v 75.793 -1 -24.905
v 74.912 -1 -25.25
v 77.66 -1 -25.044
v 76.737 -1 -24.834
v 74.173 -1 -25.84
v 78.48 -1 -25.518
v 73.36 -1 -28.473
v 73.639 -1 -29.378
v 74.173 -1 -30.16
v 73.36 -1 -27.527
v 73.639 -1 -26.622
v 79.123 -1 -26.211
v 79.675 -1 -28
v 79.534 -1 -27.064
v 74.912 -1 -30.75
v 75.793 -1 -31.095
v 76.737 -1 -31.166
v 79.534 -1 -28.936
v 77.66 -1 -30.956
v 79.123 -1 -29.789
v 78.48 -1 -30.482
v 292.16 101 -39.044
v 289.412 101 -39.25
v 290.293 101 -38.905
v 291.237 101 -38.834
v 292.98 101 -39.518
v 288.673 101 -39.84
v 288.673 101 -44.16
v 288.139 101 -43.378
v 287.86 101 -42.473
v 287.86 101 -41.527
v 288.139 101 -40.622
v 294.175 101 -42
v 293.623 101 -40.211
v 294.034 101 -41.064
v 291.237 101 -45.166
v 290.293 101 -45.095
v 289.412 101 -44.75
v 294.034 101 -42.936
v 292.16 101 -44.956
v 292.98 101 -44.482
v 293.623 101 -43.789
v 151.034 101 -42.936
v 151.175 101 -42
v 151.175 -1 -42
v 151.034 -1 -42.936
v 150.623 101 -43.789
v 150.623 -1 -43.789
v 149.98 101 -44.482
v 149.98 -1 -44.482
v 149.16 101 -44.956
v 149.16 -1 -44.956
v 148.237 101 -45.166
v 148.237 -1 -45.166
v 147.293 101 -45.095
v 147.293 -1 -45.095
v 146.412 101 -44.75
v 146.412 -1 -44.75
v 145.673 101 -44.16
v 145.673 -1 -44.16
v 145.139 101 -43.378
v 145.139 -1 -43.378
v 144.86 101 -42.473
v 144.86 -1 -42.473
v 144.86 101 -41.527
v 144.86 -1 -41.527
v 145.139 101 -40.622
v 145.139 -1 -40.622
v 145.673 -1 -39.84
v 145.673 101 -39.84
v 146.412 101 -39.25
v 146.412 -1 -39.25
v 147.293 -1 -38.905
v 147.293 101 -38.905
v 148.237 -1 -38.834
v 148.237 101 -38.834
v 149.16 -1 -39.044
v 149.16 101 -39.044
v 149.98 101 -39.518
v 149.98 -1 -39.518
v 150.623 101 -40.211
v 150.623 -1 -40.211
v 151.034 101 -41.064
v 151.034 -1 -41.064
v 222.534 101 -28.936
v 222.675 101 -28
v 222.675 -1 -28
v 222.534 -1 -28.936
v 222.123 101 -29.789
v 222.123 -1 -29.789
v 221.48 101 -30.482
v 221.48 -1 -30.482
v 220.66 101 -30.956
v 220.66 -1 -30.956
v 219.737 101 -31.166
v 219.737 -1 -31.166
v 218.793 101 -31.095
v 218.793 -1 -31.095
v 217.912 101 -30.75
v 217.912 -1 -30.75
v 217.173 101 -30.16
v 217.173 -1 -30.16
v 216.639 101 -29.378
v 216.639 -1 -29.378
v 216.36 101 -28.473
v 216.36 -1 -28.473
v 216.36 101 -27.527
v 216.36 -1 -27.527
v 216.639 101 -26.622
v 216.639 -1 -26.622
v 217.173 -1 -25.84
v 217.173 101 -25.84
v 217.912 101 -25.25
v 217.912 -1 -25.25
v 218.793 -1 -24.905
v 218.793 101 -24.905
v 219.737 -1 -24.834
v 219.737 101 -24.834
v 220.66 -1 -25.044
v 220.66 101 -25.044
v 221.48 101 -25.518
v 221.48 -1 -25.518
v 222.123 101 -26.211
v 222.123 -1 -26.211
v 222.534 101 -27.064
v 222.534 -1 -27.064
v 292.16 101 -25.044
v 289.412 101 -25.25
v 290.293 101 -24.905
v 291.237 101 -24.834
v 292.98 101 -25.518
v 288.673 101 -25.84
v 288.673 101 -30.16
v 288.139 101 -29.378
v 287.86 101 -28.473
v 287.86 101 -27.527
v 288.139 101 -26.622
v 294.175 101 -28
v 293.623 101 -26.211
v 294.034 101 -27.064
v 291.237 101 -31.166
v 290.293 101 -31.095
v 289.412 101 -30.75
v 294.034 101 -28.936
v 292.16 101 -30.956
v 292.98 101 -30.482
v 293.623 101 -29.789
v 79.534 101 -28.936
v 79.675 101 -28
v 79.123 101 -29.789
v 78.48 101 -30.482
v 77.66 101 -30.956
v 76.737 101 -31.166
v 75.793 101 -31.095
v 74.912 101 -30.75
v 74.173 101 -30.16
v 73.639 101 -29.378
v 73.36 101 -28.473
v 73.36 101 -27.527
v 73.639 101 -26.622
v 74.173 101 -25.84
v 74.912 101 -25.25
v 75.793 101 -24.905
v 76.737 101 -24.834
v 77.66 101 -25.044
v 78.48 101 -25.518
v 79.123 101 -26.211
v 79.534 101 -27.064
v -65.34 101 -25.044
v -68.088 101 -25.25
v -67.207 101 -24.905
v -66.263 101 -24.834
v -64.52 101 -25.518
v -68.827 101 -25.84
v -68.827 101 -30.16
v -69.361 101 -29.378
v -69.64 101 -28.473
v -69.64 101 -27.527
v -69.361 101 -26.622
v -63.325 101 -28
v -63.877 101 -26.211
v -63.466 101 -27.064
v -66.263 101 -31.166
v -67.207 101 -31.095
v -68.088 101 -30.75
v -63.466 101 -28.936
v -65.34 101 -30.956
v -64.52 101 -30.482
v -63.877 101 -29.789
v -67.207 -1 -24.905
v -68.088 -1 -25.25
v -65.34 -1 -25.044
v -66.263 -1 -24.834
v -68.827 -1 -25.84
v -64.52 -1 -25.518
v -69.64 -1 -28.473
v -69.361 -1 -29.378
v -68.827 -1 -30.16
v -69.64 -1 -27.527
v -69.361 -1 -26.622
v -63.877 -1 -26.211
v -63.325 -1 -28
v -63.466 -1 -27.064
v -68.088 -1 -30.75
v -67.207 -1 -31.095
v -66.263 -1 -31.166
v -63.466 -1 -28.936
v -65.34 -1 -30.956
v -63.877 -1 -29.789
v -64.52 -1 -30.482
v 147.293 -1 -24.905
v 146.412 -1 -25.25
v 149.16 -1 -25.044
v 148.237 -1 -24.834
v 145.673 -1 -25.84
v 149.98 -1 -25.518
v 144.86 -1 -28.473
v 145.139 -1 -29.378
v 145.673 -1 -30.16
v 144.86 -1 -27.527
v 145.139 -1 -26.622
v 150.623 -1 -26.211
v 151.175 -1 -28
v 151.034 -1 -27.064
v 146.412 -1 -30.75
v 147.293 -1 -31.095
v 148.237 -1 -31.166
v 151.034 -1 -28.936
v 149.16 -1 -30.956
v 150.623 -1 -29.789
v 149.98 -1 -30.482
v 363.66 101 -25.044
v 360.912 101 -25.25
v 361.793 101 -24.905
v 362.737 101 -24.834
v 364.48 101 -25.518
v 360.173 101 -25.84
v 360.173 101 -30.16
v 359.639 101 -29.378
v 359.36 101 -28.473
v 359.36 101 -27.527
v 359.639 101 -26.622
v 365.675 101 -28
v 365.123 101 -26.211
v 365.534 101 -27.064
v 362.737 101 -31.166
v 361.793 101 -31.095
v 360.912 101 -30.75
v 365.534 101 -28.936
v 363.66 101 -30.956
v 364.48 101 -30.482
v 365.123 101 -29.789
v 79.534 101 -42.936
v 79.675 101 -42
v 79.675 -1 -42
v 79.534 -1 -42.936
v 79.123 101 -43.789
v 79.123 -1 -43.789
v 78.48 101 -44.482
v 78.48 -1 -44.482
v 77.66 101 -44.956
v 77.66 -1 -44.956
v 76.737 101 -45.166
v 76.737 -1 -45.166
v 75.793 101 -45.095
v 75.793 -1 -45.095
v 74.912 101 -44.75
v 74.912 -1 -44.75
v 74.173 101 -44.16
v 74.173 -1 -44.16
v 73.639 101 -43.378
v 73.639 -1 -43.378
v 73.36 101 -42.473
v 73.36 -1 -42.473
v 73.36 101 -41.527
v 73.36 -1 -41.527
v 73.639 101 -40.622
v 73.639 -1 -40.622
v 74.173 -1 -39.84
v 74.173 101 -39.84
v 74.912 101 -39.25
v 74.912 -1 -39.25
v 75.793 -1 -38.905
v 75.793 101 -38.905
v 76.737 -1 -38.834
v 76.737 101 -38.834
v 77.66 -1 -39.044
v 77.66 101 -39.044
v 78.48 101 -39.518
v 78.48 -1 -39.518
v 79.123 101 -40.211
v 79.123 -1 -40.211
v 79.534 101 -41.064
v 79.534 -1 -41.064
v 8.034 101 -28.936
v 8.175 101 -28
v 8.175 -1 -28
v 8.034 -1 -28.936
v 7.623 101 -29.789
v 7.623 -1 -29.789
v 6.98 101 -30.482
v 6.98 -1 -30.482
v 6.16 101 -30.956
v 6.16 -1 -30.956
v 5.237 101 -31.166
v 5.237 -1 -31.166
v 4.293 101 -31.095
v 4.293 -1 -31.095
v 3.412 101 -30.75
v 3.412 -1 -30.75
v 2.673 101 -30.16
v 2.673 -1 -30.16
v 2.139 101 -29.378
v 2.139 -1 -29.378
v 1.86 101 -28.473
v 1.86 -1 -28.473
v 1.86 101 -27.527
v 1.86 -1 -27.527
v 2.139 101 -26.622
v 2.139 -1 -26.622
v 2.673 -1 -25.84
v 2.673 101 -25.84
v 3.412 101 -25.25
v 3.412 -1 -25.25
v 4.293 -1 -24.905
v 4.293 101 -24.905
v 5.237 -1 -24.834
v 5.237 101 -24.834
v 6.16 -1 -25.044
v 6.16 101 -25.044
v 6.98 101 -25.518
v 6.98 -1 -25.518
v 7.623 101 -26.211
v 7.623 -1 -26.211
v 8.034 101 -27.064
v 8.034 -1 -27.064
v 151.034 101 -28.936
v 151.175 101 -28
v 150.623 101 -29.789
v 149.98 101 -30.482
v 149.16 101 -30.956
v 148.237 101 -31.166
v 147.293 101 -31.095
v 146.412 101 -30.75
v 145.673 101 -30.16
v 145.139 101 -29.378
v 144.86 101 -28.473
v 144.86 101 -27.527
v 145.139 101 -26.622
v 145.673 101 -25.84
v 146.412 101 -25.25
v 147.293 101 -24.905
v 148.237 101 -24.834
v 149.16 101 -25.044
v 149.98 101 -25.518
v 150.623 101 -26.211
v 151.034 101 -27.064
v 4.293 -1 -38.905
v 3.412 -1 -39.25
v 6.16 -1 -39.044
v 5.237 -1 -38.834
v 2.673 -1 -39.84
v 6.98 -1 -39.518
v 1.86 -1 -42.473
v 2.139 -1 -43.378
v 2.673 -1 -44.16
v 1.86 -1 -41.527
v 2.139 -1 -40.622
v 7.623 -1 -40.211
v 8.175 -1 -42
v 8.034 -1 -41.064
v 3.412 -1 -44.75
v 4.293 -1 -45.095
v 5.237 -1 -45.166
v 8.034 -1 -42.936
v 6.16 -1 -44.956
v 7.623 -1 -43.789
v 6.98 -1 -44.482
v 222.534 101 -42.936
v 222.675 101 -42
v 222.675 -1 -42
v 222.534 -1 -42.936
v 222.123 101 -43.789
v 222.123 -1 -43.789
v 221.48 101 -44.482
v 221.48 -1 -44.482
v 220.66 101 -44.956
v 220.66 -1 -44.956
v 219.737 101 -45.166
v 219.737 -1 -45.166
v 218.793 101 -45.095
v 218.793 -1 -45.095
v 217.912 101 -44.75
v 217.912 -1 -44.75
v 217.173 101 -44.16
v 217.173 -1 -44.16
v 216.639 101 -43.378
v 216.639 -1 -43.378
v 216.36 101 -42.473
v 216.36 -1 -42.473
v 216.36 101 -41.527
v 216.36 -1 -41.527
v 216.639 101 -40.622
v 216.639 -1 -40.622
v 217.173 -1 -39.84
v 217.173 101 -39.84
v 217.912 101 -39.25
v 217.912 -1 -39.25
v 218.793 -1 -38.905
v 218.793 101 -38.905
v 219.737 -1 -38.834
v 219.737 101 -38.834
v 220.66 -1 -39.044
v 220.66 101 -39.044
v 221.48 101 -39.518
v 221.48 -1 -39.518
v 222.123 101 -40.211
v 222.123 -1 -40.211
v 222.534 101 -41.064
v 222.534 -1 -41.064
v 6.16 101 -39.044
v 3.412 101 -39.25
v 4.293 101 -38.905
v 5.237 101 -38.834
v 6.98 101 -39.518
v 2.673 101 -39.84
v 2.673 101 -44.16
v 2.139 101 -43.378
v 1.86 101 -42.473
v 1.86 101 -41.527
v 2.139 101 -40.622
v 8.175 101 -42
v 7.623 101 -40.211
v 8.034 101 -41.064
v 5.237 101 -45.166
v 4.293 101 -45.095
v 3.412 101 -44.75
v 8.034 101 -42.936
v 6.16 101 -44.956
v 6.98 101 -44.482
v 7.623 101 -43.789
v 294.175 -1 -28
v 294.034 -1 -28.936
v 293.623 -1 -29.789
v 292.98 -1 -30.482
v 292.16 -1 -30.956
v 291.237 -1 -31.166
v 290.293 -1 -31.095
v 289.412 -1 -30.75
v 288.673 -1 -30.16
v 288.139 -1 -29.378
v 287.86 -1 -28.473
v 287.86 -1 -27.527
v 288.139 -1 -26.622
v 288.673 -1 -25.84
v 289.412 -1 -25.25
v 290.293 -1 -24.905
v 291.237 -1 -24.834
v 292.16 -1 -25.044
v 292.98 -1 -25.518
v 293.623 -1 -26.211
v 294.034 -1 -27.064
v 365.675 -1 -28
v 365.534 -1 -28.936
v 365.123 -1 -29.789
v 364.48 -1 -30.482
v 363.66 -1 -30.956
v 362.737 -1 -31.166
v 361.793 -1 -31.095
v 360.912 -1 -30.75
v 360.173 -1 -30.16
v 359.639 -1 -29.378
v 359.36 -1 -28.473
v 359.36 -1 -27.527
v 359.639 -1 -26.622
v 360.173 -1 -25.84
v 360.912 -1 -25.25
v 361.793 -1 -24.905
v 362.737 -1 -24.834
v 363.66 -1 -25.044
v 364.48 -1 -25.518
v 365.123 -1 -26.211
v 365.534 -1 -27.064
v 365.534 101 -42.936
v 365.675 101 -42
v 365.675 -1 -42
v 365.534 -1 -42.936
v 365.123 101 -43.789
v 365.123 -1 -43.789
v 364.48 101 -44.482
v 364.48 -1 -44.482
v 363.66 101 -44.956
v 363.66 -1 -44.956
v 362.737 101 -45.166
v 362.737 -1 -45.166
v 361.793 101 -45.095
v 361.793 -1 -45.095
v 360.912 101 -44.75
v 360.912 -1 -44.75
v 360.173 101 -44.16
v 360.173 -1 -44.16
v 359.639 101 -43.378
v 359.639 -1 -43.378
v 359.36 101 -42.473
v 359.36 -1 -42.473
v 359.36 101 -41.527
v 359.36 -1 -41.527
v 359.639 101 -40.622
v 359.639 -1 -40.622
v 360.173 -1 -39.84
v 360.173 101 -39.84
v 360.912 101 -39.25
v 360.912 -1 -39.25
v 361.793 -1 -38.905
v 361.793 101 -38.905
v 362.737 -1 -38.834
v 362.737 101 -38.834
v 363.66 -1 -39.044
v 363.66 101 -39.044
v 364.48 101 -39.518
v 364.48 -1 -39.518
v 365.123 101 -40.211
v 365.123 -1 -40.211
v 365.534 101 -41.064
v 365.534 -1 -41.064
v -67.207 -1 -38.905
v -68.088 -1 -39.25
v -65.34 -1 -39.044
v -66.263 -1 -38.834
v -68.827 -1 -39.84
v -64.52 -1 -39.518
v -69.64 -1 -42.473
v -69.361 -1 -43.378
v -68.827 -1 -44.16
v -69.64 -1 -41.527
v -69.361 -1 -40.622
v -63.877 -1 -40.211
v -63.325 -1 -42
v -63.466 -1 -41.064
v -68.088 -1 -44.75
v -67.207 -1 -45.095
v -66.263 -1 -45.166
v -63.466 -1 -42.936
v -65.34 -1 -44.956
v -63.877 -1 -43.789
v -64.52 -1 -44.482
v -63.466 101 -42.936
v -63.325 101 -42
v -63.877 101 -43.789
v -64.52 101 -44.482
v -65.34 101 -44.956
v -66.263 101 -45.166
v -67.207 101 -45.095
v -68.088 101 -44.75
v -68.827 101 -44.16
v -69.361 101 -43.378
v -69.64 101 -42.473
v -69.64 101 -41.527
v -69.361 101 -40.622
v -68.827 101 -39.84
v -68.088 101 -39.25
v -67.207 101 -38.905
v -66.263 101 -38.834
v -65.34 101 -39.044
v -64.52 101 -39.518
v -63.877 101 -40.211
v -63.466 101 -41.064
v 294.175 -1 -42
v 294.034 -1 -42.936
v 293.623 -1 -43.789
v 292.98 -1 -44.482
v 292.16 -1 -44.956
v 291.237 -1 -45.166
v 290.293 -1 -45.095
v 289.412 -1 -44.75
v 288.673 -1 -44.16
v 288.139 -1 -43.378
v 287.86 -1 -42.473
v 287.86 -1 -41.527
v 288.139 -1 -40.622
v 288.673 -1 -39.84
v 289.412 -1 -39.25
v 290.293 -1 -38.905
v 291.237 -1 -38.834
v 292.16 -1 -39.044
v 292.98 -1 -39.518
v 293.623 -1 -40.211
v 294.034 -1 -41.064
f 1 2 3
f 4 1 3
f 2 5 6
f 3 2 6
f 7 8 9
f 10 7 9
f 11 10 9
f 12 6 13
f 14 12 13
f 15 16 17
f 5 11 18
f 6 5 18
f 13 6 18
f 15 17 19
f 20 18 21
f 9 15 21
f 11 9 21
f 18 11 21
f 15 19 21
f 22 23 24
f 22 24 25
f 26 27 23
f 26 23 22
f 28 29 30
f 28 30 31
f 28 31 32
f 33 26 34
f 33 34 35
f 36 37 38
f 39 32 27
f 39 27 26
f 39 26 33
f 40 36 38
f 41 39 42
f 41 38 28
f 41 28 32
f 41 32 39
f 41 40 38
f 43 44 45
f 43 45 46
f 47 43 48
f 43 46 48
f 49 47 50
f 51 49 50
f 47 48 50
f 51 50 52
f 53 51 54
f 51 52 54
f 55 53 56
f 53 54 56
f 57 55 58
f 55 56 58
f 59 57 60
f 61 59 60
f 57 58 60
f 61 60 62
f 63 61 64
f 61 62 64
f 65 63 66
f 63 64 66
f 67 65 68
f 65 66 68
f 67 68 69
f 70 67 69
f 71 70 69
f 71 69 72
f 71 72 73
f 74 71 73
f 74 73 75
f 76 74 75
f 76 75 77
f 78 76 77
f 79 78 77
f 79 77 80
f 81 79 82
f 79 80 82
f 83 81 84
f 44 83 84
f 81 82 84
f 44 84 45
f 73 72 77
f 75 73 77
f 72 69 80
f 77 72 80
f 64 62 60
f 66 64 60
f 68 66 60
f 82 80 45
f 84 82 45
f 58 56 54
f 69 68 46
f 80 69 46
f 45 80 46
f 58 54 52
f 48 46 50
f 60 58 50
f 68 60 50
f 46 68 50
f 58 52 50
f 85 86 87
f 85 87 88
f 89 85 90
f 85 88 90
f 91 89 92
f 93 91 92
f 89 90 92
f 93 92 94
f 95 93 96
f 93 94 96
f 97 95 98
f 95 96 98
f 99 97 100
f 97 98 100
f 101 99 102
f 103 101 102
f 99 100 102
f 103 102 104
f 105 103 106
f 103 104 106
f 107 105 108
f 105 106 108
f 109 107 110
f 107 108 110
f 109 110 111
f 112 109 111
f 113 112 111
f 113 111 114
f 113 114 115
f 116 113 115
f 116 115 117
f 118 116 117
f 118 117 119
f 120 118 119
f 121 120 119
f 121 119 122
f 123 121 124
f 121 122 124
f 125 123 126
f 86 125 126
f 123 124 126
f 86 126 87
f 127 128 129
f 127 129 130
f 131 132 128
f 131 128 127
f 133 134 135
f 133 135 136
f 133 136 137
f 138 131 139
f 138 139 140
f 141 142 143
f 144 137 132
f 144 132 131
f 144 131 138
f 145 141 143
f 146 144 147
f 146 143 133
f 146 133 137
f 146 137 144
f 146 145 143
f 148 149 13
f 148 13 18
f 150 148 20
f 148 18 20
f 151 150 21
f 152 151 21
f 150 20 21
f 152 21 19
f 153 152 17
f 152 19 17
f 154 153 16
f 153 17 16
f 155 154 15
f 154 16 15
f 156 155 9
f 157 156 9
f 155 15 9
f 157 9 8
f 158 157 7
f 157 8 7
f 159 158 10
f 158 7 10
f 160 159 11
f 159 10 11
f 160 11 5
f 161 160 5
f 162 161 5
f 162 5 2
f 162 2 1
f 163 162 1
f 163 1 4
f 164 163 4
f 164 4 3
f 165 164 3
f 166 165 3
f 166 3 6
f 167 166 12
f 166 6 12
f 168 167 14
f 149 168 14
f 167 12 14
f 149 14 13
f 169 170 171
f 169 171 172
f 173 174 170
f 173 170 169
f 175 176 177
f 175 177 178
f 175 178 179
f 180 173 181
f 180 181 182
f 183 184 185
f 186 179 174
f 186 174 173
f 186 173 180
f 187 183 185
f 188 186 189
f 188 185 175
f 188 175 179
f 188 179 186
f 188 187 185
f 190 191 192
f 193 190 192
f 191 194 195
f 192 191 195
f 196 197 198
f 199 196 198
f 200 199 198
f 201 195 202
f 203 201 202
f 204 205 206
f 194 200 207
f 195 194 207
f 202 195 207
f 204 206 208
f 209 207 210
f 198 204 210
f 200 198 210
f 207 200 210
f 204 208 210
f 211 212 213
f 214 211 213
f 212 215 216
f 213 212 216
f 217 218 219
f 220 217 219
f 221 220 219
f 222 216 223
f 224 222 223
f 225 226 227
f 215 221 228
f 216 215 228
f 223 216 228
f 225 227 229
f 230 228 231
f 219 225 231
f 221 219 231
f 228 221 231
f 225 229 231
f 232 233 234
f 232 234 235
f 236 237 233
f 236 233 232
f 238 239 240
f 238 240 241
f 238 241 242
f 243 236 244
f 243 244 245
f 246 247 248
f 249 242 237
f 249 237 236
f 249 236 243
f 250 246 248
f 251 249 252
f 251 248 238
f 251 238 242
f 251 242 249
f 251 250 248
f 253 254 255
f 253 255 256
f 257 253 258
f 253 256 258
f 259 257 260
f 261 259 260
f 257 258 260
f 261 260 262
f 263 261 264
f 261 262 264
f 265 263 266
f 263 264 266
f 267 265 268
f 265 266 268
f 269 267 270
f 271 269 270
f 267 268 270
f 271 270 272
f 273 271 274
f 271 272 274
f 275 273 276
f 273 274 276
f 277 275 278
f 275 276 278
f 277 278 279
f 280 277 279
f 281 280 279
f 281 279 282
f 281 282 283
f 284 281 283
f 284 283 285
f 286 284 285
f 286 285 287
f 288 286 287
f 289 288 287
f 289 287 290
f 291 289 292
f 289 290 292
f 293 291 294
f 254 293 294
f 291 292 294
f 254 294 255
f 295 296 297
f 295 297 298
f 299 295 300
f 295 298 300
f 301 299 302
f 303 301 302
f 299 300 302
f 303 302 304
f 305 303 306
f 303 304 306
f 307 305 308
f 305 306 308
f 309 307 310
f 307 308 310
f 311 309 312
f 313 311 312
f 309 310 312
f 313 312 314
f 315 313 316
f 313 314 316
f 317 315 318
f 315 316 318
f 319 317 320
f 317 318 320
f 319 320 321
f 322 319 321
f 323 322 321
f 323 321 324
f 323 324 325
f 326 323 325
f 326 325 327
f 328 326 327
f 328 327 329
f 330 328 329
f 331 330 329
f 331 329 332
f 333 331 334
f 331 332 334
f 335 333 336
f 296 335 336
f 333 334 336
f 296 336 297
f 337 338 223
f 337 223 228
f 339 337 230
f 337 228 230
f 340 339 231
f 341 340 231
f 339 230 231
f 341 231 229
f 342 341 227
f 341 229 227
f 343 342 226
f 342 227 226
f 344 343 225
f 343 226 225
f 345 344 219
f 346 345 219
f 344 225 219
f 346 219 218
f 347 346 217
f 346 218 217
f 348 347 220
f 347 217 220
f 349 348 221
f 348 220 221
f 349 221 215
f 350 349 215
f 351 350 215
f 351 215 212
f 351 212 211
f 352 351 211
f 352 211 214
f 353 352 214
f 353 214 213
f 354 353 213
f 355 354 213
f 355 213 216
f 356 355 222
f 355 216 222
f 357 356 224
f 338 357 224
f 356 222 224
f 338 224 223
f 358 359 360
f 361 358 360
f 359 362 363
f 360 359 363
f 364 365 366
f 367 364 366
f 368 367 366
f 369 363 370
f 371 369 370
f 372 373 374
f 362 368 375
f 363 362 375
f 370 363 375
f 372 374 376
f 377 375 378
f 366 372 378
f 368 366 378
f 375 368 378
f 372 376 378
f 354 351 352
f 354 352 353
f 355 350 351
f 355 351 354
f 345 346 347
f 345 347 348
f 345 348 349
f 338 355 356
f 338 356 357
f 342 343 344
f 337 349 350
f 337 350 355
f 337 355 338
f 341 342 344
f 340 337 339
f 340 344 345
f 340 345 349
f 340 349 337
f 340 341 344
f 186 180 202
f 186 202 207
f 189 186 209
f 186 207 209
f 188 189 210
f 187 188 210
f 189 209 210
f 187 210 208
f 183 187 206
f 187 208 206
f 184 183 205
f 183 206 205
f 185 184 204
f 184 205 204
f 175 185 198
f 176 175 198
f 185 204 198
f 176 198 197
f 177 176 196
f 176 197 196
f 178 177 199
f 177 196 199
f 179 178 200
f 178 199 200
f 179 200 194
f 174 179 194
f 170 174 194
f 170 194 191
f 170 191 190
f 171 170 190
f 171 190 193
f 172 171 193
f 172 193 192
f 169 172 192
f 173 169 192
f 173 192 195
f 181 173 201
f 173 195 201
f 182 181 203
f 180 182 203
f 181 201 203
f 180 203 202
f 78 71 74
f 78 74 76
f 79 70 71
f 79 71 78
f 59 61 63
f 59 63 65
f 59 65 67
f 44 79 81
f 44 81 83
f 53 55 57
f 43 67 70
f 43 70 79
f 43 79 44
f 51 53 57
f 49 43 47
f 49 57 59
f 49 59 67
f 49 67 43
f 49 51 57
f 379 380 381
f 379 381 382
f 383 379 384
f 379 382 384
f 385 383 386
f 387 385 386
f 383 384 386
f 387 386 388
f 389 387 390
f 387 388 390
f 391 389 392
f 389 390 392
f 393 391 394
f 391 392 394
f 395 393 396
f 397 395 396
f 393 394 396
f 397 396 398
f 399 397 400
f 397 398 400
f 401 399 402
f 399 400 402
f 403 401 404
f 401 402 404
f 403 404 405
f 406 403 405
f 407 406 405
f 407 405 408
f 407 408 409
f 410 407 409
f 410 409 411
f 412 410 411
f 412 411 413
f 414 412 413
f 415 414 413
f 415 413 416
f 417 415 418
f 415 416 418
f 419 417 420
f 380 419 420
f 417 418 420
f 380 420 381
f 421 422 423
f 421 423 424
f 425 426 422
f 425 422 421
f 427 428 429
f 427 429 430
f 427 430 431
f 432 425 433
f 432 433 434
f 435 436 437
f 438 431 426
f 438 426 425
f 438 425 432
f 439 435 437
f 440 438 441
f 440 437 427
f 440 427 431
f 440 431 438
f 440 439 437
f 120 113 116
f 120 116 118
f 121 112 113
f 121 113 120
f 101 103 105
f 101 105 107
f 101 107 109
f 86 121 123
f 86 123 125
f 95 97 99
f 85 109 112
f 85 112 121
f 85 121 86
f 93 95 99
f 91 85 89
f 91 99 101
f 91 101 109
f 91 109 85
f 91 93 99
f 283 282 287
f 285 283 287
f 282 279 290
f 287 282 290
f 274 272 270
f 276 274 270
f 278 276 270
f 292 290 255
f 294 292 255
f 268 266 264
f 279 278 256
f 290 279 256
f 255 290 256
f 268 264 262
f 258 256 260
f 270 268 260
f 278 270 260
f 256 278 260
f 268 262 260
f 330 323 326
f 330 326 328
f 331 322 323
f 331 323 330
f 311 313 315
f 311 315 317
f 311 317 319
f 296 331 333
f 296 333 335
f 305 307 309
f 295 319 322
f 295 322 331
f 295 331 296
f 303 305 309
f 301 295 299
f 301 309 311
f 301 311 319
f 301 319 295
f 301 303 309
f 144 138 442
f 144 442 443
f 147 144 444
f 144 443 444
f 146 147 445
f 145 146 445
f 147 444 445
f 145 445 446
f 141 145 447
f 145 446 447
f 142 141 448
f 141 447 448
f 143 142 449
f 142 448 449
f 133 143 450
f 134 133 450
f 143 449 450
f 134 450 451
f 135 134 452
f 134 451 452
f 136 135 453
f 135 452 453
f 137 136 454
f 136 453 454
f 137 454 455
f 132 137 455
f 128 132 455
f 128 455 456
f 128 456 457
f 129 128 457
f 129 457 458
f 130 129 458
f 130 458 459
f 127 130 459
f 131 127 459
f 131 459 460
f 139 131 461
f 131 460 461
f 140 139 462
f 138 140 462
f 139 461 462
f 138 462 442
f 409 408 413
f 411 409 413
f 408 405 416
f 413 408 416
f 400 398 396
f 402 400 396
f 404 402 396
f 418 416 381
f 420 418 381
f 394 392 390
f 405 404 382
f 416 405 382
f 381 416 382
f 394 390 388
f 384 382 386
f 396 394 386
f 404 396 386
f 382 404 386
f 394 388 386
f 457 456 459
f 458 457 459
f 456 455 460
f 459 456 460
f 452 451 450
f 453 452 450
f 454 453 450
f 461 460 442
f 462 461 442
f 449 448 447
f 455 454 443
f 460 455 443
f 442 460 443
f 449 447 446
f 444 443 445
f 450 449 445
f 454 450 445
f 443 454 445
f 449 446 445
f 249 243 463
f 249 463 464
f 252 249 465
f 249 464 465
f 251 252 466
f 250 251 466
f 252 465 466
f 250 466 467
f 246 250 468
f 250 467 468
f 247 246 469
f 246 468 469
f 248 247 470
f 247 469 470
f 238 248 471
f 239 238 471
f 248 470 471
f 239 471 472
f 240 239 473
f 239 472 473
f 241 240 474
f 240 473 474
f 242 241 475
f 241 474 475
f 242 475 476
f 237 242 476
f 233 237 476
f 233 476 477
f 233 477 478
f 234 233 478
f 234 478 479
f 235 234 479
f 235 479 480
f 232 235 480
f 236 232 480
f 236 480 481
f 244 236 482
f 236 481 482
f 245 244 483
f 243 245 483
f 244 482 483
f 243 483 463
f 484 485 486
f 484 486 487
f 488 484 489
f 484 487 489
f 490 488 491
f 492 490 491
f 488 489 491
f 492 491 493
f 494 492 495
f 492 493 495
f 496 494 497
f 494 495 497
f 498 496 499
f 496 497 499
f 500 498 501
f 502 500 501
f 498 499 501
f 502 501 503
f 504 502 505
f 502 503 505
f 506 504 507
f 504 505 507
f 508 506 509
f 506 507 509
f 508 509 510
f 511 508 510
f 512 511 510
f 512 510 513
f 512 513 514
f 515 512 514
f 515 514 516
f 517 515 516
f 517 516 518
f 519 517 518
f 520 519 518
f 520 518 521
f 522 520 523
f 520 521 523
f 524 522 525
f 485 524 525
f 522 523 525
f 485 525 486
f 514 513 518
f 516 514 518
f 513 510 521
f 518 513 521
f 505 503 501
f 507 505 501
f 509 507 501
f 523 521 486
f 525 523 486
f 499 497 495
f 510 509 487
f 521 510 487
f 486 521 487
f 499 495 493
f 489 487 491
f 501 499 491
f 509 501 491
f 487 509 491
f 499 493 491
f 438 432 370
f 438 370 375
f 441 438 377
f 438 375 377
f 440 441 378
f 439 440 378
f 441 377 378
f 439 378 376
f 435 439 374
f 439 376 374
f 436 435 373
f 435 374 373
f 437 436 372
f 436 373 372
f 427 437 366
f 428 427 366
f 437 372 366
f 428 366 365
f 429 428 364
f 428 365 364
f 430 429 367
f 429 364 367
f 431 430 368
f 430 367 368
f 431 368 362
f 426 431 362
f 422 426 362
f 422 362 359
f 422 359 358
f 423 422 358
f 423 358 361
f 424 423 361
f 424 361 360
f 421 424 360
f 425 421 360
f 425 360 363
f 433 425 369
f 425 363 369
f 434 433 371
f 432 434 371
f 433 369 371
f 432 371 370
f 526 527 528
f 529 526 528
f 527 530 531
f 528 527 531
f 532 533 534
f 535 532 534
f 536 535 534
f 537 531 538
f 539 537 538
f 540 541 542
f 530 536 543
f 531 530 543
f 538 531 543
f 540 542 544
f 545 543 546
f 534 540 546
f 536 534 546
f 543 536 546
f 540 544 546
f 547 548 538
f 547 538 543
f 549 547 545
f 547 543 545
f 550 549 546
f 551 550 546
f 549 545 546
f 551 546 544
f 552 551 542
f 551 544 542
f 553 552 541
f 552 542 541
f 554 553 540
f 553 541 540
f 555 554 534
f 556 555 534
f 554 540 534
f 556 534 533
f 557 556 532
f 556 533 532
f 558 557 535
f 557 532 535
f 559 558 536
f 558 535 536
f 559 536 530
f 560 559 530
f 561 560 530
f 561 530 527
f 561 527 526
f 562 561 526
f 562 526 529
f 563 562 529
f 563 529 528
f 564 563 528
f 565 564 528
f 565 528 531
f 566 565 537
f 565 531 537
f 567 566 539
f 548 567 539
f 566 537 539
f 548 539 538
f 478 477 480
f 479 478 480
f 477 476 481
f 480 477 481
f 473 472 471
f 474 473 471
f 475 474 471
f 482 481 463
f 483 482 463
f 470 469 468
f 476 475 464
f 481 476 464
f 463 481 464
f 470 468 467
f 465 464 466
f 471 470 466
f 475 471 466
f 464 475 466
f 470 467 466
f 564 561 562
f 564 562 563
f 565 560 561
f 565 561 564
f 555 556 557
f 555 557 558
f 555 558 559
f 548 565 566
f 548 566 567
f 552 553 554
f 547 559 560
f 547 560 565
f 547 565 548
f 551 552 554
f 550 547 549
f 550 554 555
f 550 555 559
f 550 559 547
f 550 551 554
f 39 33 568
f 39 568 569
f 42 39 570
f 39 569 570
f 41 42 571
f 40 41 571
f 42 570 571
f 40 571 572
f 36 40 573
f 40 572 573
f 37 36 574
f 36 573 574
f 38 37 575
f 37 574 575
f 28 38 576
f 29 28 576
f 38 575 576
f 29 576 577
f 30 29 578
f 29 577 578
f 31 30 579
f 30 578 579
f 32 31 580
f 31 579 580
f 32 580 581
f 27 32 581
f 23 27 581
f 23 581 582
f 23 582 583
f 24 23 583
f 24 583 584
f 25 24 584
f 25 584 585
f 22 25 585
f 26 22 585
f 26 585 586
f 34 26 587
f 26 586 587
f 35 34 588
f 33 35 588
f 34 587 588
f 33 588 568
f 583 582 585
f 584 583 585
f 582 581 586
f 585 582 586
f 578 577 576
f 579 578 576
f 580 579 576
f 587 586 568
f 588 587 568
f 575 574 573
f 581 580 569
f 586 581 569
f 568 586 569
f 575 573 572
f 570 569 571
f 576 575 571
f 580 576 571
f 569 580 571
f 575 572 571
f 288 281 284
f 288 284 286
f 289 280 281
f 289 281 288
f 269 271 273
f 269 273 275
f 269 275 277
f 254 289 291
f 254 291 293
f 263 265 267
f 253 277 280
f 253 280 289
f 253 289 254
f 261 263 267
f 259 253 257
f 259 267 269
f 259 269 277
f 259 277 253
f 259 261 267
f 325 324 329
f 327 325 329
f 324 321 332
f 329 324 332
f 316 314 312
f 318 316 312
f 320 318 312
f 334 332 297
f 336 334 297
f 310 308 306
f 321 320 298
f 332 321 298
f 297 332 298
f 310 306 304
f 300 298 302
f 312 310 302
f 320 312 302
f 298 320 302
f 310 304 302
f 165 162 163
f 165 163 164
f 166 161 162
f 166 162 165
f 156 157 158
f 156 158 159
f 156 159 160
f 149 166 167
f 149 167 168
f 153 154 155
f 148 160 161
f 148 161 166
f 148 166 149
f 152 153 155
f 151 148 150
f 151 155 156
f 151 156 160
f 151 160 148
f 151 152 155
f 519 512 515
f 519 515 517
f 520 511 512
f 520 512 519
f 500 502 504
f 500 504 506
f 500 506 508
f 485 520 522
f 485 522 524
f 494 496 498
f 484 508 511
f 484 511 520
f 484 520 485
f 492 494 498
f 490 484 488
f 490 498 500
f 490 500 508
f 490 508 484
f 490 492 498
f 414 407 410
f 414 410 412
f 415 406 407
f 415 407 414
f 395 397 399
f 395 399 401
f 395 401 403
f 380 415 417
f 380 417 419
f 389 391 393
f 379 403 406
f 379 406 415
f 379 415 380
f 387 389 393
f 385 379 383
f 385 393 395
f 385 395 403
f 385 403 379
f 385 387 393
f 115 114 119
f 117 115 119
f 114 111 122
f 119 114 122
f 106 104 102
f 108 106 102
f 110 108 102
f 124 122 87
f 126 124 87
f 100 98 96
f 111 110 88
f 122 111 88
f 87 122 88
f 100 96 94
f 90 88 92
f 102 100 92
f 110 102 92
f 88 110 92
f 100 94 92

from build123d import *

# Parameters (mm, degrees)
SKETCH1_R              = 3.175
BOSS_EXTRUDE1_DEPTH    = 102
BOSS_EXTRUDE1_2_DEPTH  = 102
BOSS_EXTRUDE1_3_DEPTH  = 102
BOSS_EXTRUDE1_4_DEPTH  = 102
BOSS_EXTRUDE1_5_DEPTH  = 102
BOSS_EXTRUDE1_6_DEPTH  = 102
BOSS_EXTRUDE1_7_DEPTH  = 102
BOSS_EXTRUDE1_8_DEPTH  = 102
BOSS_EXTRUDE1_9_DEPTH  = 102
BOSS_EXTRUDE1_10_DEPTH = 102
BOSS_EXTRUDE1_11_DEPTH = 102
BOSS_EXTRUDE1_12_DEPTH = 102
BOSS_EXTRUDE1_13_DEPTH = 102
BOSS_EXTRUDE1_14_DEPTH = 102


with BuildPart() as part:
    # Sketch1 → Boss-Extrude1 (new body)
    with BuildSketch(Plane(origin=(0, -1, 0), x_dir=(1, 0, 0), z_dir=(0, 1, 0))):
        with Locations((-66.5, 42)):
            Circle(SKETCH1_R)
    extrude(amount=BOSS_EXTRUDE1_DEPTH)


with BuildPart() as body_2:
    # Sketch1 → Boss-Extrude1 2 (new body)
    with BuildSketch(Plane(origin=(0, -1, 0), x_dir=(1, 0, 0), z_dir=(0, 1, 0))):
        with Locations((-66.5, 28)):
            Circle(SKETCH1_R)
    extrude(amount=BOSS_EXTRUDE1_2_DEPTH)


with BuildPart() as body_3:
    # Sketch1 → Boss-Extrude1 3 (new body)
    with BuildSketch(Plane(origin=(0, -1, 0), x_dir=(1, 0, 0), z_dir=(0, 1, 0))):
        with Locations((5, 42)):
            Circle(SKETCH1_R)
    extrude(amount=BOSS_EXTRUDE1_3_DEPTH)


with BuildPart() as body_4:
    # Sketch1 → Boss-Extrude1 4 (new body)
    with BuildSketch(Plane(origin=(0, -1, 0), x_dir=(1, 0, 0), z_dir=(0, 1, 0))):
        with Locations((5, 28)):
            Circle(SKETCH1_R)
    extrude(amount=BOSS_EXTRUDE1_4_DEPTH)


with BuildPart() as body_5:
    # Sketch1 → Boss-Extrude1 5 (new body)
    with BuildSketch(Plane(origin=(0, -1, 0), x_dir=(1, 0, 0), z_dir=(0, 1, 0))):
        with Locations((76.5, 42)):
            Circle(SKETCH1_R)
    extrude(amount=BOSS_EXTRUDE1_5_DEPTH)


with BuildPart() as body_6:
    # Sketch1 → Boss-Extrude1 6 (new body)
    with BuildSketch(Plane(origin=(0, -1, 0), x_dir=(1, 0, 0), z_dir=(0, 1, 0))):
        with Locations((76.5, 28)):
            Circle(SKETCH1_R)
    extrude(amount=BOSS_EXTRUDE1_6_DEPTH)


with BuildPart() as body_7:
    # Sketch1 → Boss-Extrude1 7 (new body)
    with BuildSketch(Plane(origin=(0, -1, 0), x_dir=(1, 0, 0), z_dir=(0, 1, 0))):
        with Locations((148, 42)):
            Circle(SKETCH1_R)
    extrude(amount=BOSS_EXTRUDE1_7_DEPTH)


with BuildPart() as body_8:
    # Sketch1 → Boss-Extrude1 8 (new body)
    with BuildSketch(Plane(origin=(0, -1, 0), x_dir=(1, 0, 0), z_dir=(0, 1, 0))):
        with Locations((148, 28)):
            Circle(SKETCH1_R)
    extrude(amount=BOSS_EXTRUDE1_8_DEPTH)


with BuildPart() as body_9:
    # Sketch1 → Boss-Extrude1 9 (new body)
    with BuildSketch(Plane(origin=(0, -1, 0), x_dir=(1, 0, 0), z_dir=(0, 1, 0))):
        with Locations((219.5, 42)):
            Circle(SKETCH1_R)
    extrude(amount=BOSS_EXTRUDE1_9_DEPTH)


with BuildPart() as body_10:
    # Sketch1 → Boss-Extrude1 10 (new body)
    with BuildSketch(Plane(origin=(0, -1, 0), x_dir=(1, 0, 0), z_dir=(0, 1, 0))):
        with Locations((219.5, 28)):
            Circle(SKETCH1_R)
    extrude(amount=BOSS_EXTRUDE1_10_DEPTH)


with BuildPart() as body_11:
    # Sketch1 → Boss-Extrude1 11 (new body)
    with BuildSketch(Plane(origin=(0, -1, 0), x_dir=(1, 0, 0), z_dir=(0, 1, 0))):
        with Locations((291, 42)):
            Circle(SKETCH1_R)
    extrude(amount=BOSS_EXTRUDE1_11_DEPTH)


with BuildPart() as body_12:
    # Sketch1 → Boss-Extrude1 12 (new body)
    with BuildSketch(Plane(origin=(0, -1, 0), x_dir=(1, 0, 0), z_dir=(0, 1, 0))):
        with Locations((291, 28)):
            Circle(SKETCH1_R)
    extrude(amount=BOSS_EXTRUDE1_12_DEPTH)


with BuildPart() as body_13:
    # Sketch1 → Boss-Extrude1 13 (new body)
    with BuildSketch(Plane(origin=(0, -1, 0), x_dir=(1, 0, 0), z_dir=(0, 1, 0))):
        with Locations((362.5, 42)):
            Circle(SKETCH1_R)
    extrude(amount=BOSS_EXTRUDE1_13_DEPTH)


with BuildPart() as body_14:
    # Sketch1 → Boss-Extrude1 14 (new body)
    with BuildSketch(Plane(origin=(0, -1, 0), x_dir=(1, 0, 0), z_dir=(0, 1, 0))):
        with Locations((362.5, 28)):
            Circle(SKETCH1_R)
    extrude(amount=BOSS_EXTRUDE1_14_DEPTH)


solid = Compound([part.part, body_2.part, body_3.part, body_4.part, body_5.part, body_6.part, body_7.part, body_8.part, body_9.part, body_10.part, body_11.part, body_12.part, body_13.part, body_14.part])
